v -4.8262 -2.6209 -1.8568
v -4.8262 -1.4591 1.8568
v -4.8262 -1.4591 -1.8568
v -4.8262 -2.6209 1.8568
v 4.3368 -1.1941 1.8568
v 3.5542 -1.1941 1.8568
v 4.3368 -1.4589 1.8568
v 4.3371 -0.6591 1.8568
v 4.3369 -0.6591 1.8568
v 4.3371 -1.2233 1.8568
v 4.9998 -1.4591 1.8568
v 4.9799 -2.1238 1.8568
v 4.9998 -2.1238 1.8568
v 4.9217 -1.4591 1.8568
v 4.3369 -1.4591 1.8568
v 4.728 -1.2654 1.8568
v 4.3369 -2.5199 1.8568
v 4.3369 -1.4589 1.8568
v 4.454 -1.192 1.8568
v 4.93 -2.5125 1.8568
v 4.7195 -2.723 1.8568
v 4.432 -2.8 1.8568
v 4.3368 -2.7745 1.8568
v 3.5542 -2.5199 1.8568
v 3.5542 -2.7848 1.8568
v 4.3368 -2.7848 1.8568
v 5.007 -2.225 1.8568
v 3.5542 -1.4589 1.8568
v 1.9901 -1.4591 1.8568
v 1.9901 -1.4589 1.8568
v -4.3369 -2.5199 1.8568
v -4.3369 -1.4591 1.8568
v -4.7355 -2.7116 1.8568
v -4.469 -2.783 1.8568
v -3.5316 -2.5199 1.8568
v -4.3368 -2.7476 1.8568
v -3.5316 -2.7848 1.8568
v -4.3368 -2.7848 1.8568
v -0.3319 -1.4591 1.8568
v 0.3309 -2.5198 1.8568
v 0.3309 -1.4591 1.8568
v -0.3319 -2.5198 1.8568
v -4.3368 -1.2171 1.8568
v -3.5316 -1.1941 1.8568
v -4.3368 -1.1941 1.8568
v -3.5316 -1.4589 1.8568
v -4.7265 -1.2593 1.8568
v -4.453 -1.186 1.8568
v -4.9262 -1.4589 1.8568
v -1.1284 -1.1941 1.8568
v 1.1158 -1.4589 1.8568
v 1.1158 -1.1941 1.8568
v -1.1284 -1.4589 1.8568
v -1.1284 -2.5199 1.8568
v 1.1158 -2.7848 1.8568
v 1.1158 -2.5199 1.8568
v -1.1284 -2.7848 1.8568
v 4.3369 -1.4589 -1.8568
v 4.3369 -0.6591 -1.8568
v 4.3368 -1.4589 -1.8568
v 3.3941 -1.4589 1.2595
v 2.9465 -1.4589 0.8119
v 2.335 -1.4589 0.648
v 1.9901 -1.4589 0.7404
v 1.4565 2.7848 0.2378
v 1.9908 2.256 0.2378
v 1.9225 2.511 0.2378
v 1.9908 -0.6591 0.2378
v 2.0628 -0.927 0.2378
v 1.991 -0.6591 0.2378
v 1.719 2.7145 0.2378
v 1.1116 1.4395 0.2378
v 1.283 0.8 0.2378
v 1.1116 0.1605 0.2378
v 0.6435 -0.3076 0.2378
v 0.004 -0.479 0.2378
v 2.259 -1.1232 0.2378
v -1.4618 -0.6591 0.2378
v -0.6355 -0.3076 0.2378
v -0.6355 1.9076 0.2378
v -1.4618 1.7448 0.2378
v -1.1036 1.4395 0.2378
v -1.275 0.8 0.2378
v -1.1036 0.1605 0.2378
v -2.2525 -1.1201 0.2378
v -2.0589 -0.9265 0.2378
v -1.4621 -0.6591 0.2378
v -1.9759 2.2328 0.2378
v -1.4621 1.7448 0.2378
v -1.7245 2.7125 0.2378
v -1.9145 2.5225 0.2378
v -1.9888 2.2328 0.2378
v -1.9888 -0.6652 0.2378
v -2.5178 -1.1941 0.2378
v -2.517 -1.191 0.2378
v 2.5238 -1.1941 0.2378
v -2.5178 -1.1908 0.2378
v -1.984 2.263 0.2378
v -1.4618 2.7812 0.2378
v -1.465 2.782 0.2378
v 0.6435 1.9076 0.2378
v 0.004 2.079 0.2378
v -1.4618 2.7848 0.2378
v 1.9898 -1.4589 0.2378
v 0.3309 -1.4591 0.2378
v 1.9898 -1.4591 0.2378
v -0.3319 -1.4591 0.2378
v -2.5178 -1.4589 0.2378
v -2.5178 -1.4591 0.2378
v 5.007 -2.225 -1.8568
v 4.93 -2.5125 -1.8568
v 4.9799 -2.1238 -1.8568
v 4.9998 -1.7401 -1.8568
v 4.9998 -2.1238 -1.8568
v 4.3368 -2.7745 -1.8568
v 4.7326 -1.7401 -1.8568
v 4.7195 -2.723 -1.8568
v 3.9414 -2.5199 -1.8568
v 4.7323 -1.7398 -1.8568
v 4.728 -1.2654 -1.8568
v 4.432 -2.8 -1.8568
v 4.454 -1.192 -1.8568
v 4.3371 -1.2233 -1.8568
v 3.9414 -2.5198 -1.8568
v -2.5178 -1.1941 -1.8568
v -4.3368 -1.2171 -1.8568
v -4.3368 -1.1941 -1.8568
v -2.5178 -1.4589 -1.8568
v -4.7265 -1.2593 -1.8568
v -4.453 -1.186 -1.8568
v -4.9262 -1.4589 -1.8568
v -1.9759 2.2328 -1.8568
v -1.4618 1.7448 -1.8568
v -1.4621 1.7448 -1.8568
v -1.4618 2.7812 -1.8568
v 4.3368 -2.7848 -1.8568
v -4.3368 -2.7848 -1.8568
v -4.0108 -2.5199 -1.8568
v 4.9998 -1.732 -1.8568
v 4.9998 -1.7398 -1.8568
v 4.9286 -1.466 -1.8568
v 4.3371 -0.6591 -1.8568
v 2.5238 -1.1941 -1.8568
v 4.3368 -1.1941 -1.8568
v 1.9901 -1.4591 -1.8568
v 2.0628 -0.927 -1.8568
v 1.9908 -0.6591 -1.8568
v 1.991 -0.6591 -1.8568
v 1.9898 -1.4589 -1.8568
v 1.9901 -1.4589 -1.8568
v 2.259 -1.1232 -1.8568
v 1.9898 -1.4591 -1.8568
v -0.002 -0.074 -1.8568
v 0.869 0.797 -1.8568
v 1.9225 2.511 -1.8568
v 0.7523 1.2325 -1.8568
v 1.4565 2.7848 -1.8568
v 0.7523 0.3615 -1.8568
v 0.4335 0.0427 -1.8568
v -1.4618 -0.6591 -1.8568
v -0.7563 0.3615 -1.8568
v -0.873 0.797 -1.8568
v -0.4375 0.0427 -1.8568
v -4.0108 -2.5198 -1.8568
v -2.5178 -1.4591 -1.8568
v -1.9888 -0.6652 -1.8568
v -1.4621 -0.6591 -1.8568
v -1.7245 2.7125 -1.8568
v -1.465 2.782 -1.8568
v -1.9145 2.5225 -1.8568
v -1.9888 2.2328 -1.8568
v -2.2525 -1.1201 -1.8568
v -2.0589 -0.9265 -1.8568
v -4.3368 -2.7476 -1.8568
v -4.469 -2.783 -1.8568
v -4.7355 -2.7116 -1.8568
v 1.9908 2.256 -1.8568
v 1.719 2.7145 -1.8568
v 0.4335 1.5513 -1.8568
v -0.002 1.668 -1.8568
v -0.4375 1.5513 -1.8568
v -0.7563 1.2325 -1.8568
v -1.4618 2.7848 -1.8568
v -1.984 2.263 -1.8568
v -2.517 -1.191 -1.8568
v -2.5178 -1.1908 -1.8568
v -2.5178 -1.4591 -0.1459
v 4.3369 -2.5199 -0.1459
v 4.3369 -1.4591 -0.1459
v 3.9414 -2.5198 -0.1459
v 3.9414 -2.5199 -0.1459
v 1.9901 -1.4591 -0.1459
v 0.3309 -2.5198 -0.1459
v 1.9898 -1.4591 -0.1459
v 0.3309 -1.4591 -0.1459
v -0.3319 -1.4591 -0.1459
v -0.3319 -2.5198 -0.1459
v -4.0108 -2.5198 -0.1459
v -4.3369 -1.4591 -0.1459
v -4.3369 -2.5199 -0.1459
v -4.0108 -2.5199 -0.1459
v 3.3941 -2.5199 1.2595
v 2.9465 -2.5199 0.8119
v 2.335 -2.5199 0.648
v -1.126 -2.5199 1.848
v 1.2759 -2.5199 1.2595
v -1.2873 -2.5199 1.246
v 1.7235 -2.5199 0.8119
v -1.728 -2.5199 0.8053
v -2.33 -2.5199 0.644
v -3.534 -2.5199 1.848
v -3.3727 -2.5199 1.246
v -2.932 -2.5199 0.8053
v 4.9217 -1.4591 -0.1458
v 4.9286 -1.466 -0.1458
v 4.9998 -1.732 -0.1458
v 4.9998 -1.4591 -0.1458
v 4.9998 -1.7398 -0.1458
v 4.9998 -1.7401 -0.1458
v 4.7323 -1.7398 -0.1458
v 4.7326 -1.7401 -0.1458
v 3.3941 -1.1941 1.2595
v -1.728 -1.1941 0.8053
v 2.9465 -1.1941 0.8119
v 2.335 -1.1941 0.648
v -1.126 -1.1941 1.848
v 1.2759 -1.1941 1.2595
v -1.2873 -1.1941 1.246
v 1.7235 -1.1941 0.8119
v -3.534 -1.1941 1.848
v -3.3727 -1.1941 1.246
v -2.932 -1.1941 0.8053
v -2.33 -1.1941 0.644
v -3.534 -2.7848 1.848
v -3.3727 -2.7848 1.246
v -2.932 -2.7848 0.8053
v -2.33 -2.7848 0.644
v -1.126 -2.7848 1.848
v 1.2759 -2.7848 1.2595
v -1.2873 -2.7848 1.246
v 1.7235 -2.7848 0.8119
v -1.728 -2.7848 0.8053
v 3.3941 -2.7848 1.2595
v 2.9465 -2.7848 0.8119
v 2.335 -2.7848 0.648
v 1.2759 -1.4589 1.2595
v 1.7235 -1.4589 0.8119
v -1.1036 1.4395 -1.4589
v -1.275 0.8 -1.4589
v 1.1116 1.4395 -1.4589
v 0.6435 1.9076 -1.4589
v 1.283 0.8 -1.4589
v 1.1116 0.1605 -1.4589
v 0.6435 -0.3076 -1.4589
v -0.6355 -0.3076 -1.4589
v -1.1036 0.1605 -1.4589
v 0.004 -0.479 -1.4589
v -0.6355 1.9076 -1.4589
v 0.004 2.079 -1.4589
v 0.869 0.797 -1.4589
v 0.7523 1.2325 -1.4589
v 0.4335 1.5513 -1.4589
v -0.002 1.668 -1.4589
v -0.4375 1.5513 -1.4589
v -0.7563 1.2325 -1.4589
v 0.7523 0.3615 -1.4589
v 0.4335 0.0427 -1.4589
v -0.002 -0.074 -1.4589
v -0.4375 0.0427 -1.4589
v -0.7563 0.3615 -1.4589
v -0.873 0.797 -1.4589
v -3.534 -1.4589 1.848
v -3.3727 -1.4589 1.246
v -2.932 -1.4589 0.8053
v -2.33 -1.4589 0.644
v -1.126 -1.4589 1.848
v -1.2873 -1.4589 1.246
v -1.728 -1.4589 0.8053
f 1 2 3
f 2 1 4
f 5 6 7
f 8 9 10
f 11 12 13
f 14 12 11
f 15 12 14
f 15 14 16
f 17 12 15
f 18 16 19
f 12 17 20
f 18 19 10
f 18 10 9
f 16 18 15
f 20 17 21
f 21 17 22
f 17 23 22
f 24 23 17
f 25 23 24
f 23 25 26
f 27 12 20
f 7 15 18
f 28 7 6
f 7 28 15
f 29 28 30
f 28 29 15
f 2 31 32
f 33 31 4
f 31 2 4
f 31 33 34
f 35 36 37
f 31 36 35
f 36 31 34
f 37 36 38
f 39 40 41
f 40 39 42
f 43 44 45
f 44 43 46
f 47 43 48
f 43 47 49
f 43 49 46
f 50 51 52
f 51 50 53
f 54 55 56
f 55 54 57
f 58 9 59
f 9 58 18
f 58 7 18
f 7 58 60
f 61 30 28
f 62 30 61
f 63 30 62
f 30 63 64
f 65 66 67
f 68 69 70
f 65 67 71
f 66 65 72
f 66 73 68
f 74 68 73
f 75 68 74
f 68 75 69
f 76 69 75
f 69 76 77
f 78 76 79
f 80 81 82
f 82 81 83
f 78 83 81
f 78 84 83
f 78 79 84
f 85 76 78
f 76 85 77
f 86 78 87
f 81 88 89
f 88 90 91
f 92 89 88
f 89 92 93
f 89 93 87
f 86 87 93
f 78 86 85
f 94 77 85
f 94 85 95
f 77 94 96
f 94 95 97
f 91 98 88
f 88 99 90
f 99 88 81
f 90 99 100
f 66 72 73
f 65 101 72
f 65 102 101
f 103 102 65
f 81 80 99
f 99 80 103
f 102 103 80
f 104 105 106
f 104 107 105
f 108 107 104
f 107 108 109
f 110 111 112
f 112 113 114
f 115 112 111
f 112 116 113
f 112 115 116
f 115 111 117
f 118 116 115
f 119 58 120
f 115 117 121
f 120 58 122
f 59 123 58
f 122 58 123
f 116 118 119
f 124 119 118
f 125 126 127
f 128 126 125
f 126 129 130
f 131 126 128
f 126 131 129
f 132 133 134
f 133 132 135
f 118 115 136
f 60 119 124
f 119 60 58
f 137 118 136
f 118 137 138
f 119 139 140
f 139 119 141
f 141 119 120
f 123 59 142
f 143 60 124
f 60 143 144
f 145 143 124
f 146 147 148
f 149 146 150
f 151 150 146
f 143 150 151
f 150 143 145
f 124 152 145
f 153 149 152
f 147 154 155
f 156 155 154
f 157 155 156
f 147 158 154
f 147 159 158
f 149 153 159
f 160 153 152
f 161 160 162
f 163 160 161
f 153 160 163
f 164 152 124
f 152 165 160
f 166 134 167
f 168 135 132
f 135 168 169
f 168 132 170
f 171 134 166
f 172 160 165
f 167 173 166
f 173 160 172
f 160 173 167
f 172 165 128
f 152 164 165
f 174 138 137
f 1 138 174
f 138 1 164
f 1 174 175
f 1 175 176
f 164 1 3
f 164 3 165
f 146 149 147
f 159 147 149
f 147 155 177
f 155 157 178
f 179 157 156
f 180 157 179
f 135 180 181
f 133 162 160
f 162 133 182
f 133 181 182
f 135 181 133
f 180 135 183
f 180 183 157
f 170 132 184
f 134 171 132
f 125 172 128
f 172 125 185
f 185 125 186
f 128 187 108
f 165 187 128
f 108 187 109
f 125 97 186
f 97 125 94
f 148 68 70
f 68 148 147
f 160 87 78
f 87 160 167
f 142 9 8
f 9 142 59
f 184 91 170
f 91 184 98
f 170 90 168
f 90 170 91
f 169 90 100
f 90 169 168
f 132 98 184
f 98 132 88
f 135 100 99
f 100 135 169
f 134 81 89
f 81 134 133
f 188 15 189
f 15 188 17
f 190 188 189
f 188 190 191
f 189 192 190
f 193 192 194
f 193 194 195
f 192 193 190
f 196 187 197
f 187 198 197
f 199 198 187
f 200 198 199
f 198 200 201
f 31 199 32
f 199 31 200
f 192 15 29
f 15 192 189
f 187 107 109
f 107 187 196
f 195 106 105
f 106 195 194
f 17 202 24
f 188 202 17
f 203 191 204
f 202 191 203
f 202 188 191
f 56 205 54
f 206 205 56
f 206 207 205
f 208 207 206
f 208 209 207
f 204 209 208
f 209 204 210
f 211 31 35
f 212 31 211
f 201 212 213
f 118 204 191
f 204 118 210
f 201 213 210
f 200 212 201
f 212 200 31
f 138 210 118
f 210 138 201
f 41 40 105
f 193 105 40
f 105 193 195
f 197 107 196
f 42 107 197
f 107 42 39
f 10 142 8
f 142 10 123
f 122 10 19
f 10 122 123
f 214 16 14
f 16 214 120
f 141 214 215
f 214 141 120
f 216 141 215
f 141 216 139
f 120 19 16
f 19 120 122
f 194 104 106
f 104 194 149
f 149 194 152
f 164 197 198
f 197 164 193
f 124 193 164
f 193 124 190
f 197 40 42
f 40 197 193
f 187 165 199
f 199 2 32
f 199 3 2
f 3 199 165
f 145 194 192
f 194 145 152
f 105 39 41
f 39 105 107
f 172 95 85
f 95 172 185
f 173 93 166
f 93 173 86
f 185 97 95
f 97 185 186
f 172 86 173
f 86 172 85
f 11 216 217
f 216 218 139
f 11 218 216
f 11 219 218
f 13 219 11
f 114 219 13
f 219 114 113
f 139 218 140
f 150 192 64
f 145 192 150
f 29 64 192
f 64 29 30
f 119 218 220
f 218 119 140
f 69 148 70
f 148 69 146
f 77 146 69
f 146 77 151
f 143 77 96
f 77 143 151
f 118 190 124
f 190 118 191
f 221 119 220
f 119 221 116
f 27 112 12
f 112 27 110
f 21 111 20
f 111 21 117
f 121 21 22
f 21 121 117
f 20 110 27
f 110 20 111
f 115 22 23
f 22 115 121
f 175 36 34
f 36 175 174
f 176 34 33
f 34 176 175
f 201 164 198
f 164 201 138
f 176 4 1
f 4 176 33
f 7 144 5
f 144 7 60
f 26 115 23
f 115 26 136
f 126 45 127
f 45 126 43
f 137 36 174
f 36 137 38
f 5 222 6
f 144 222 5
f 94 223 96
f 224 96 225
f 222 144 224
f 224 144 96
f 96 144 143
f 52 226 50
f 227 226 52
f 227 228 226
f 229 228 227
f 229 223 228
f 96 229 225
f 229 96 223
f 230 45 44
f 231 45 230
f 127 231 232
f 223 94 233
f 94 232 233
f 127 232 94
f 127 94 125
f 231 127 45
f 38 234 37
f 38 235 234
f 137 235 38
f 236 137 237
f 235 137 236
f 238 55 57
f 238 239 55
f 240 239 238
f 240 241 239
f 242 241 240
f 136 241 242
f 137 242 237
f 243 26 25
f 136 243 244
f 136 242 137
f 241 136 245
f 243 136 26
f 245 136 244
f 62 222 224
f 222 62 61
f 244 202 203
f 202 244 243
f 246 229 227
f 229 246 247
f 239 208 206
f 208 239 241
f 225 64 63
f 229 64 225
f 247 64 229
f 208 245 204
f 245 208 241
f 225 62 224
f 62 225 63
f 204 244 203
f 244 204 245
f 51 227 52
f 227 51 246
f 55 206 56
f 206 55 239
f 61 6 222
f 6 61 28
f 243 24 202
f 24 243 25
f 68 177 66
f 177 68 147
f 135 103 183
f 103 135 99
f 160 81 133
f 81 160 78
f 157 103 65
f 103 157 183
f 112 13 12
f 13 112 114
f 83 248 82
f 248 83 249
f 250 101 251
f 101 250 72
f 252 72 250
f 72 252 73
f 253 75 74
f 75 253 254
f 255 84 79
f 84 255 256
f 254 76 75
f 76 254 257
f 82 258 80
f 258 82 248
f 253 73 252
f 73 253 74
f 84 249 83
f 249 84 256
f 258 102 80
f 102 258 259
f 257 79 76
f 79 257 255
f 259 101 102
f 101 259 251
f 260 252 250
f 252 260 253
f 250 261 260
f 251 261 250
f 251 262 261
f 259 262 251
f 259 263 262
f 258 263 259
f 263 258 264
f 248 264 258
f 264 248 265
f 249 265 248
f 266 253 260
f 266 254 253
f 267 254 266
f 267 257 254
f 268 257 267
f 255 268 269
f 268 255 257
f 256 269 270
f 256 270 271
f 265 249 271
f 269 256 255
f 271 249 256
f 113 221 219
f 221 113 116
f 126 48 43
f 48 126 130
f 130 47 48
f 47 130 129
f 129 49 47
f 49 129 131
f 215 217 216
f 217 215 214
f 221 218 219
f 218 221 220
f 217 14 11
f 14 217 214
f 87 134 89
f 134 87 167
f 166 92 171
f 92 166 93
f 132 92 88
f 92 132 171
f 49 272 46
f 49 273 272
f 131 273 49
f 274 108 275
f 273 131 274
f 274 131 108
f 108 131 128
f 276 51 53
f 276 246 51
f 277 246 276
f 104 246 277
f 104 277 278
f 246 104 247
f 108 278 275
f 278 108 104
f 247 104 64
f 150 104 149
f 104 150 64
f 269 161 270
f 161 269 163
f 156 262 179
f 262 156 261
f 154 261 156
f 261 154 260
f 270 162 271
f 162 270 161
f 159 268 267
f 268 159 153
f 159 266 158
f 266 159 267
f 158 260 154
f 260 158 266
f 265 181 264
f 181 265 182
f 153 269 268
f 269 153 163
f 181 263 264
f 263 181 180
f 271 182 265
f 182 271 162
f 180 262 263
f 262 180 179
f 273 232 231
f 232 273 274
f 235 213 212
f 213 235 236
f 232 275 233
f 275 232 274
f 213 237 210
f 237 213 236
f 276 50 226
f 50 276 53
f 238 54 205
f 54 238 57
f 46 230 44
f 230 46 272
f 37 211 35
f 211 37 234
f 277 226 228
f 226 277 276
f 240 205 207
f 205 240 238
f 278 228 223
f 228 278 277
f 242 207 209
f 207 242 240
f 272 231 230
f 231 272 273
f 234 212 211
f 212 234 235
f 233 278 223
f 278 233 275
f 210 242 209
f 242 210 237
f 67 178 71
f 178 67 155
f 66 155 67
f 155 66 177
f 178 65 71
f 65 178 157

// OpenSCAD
intersection() {
  cube(size = [11.9997, 6.6837, 4.4557], center = true);

  union() {
    intersection() {
      difference() {
        union() {
          translate([0.004, -1.1995, -0.8095])
          cube(size = [5.0437, 1.0807, 2.0947], center = true);
        
          translate([-1.465, 2.263, -0.8095])
          cylinder(h = 2.0947, r1 = 0.519, r2 = 0.519, center = true, $fn = 12);
        
          difference() {
            translate([2.954, -2.124, -8.1215])
            cylinder(h = 19.9567, r1 = 7.954, r2 = 7.954, center = true, $fn = 15);
          
            translate([0.9095, 0.663, 0])
            cube(size = [6.8548, 4.2438, 3.7138], center = true);
          }
        }
      
        union() {
          difference() {
            translate([0, -1.9895, 8.977])
            cube(size = [8.6738, 1.0608, 18.2458], center = true);
          
            translate([-0.0005, -1.5895, 8.3205])
            cube(size = [0.6629, 1.8609, 19.5589], center = true);
          }
        
          difference() {
            translate([11.2185, 0.5225, -8.1215])
            cube(size = [13.7628, 4.5248, 19.9568], center = true);
          
            translate([4.454, -1.74, 0])
            cylinder(h = 3.7139, r1 = 0.548, r2 = 0.548, center = true, $fn = 12);
          }
        }
      }
    
      union() {
        translate([4.432, -2.225, 0])
        cylinder(h = 3.7137, r1 = 0.575, r2 = 0.575, center = true, $fn = 12);
      
        difference() {
          union() {
            translate([-0.264, 0.1325, -0.8095])
            cube(size = [4.5077, 5.3047, 2.0947], center = true);
          
            translate([-6.8815, -1.9895, 0])
            cube(size = [22.4367, 1.0607, 3.7137], center = true);
          }
        
          union() {
            translate([-2.517, -0.662, -0.8095])
            cylinder(h = 2.0948, r1 = 0.529, r2 = 0.529, center = true, $fn = 12);
          
            translate([-11.2185, -2.322, -8.1215])
            cube(size = [13.7628, 0.3958, 19.9568], center = true);
          }
        }
      
        translate([-4.469, -2.25, 0])
        cylinder(h = 3.7137, r1 = 0.533, r2 = 0.533, center = true, $fn = 12);
      
        difference() {
          translate([3.495, -1.1995, 0])
          cube(size = [3.0097, 1.0807, 3.7137], center = true);
        
          translate([2.527, -0.659, 8.1215])
          cylinder(h = 19.9568, r1 = 0.536, r2 = 0.536, center = true, $fn = 12);
        }
      }
    }
  
    difference() {
      union() {
        difference() {
          translate([0, -1.9895, 0])
          cube(size = [8.6737, 1.5907, 3.7137], center = true);
        
          translate([2.335, 0, 1.871])
          rotate([180, 90, -90])
          cylinder(h = 36.1998, r1 = 1.223, r2 = 1.223, center = true, $fn = 12);
        }
      
        translate([2.334, -1.932, -0.8095])
        cube(size = [5.3317, 0.3837, 2.0947], center = true);
      
        difference() {
          translate([0.2645, 0.3305, -0.8095])
          cube(size = [3.4527, 4.9087, 2.0947], center = true);
        
          translate([0.004, 0.8, 8.3205])
          cylinder(h = 19.5588, r1 = 1.279, r2 = 1.279, center = true, $fn = 12);
        }
      
        translate([-4.453, -1.733, 0])
        cylinder(h = 3.7137, r1 = 0.547, r2 = 0.547, center = true, $fn = 12);
      
        translate([0.3315, -1.7915, 0.8555])
        cube(size = [9.3367, 0.6647, 2.0027], center = true);
      
        translate([-1.7255, 0.2465, -0.8095])
        cube(size = [0.5267, 3.9727, 2.0947], center = true);
      }
    
      union() {
        difference() {
          translate([-6.8815, -0.1435, 0])
          cube(size = [22.4368, 4.7528, 3.7138], center = true);
        
          difference() {
            translate([-6.8815, 0.387, 0])
            cube(size = [22.4369, 3.6919, 3.7139], center = true);
          
            translate([-0.002, 0.797, 8.1215])
            cylinder(h = 19.957, r1 = 0.871, r2 = 0.871, center = true, $fn = 12);
          }
        }
      
        difference() {
          union() {
            translate([9.7715, 10.1665, 0])
            cube(size = [16.6568, 15.8668, 36.1998], center = true);
          
            translate([-2.33, -4.44089e-16, 1.848])
            rotate([180, 90, -90])
            cylinder(h = 5.5698, r1 = 1.204, r2 = 1.204, center = true, $fn = 12);
          }
        
          translate([1.441, 2.233, -8.9305])
          cylinder(h = 18.3389, r1 = 0.556, r2 = 0.556, center = true, $fn = 12);
        }
      }
    }
  }
}
